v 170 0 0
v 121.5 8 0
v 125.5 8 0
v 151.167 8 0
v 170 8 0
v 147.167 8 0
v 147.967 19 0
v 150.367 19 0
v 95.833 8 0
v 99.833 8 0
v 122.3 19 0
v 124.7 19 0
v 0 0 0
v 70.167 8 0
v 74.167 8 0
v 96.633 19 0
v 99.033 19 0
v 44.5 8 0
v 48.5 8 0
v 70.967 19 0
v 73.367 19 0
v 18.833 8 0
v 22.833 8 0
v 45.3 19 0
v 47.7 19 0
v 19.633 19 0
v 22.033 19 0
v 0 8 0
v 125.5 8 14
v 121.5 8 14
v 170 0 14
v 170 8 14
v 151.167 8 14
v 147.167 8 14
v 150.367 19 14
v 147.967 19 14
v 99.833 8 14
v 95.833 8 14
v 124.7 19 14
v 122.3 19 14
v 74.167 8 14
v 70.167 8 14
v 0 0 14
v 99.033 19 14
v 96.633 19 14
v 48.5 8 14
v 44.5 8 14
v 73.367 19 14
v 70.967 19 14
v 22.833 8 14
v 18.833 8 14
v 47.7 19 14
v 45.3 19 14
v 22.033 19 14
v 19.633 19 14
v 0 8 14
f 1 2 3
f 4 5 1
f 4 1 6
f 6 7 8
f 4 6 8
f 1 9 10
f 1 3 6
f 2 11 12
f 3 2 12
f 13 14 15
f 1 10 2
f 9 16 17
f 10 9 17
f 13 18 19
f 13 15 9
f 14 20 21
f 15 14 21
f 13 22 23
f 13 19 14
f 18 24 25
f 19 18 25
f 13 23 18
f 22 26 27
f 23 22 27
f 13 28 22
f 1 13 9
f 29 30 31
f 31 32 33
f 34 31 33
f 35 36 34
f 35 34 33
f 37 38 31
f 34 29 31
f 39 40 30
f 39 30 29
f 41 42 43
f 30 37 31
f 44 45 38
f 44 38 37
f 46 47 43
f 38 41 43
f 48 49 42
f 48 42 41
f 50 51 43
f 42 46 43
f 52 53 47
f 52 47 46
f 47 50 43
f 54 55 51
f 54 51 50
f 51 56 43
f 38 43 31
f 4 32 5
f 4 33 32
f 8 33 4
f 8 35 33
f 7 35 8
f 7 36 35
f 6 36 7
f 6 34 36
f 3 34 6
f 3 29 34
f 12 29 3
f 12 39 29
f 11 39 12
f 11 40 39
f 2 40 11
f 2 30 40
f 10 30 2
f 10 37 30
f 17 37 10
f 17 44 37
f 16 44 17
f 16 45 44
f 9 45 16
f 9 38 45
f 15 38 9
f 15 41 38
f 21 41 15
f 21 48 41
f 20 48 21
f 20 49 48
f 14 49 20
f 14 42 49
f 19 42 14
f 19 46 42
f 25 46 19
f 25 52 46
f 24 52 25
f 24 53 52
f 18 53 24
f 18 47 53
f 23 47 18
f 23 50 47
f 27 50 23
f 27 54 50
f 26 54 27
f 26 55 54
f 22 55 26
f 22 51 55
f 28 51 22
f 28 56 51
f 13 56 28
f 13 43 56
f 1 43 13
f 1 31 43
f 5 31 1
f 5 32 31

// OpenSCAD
$fn = 32;

// ----------------------------------------------------------------------
// Gear rack: 6 teeth on a 170 mm bar, pitch 25.67 mm
// ----------------------------------------------------------------------

// --- parameters (mm) ---
profile_height = 14;      // extrusion height
profile_points = 28;      // points of the closed outline

profile = [[0, 0], [170, 0], [170, 8], [151.167, 8], [150.367, 19], [147.967, 19], [147.167, 8], [125.5, 8], [124.7, 19], [122.3, 19], [121.5, 8], [99.833, 8], [99.033, 19], [96.633, 19], [95.833, 8], [74.167, 8], [73.367, 19], [70.967, 19], [70.167, 8], [48.5, 8], [47.7, 19], [45.3, 19], [44.5, 8], [22.833, 8], [22.033, 19], [19.633, 19], [18.833, 8], [0, 8]];  // single closed polygon, 28 points, counter clockwise

// --- the one profile operation ---
linear_extrude(height = profile_height) polygon(points = profile);
